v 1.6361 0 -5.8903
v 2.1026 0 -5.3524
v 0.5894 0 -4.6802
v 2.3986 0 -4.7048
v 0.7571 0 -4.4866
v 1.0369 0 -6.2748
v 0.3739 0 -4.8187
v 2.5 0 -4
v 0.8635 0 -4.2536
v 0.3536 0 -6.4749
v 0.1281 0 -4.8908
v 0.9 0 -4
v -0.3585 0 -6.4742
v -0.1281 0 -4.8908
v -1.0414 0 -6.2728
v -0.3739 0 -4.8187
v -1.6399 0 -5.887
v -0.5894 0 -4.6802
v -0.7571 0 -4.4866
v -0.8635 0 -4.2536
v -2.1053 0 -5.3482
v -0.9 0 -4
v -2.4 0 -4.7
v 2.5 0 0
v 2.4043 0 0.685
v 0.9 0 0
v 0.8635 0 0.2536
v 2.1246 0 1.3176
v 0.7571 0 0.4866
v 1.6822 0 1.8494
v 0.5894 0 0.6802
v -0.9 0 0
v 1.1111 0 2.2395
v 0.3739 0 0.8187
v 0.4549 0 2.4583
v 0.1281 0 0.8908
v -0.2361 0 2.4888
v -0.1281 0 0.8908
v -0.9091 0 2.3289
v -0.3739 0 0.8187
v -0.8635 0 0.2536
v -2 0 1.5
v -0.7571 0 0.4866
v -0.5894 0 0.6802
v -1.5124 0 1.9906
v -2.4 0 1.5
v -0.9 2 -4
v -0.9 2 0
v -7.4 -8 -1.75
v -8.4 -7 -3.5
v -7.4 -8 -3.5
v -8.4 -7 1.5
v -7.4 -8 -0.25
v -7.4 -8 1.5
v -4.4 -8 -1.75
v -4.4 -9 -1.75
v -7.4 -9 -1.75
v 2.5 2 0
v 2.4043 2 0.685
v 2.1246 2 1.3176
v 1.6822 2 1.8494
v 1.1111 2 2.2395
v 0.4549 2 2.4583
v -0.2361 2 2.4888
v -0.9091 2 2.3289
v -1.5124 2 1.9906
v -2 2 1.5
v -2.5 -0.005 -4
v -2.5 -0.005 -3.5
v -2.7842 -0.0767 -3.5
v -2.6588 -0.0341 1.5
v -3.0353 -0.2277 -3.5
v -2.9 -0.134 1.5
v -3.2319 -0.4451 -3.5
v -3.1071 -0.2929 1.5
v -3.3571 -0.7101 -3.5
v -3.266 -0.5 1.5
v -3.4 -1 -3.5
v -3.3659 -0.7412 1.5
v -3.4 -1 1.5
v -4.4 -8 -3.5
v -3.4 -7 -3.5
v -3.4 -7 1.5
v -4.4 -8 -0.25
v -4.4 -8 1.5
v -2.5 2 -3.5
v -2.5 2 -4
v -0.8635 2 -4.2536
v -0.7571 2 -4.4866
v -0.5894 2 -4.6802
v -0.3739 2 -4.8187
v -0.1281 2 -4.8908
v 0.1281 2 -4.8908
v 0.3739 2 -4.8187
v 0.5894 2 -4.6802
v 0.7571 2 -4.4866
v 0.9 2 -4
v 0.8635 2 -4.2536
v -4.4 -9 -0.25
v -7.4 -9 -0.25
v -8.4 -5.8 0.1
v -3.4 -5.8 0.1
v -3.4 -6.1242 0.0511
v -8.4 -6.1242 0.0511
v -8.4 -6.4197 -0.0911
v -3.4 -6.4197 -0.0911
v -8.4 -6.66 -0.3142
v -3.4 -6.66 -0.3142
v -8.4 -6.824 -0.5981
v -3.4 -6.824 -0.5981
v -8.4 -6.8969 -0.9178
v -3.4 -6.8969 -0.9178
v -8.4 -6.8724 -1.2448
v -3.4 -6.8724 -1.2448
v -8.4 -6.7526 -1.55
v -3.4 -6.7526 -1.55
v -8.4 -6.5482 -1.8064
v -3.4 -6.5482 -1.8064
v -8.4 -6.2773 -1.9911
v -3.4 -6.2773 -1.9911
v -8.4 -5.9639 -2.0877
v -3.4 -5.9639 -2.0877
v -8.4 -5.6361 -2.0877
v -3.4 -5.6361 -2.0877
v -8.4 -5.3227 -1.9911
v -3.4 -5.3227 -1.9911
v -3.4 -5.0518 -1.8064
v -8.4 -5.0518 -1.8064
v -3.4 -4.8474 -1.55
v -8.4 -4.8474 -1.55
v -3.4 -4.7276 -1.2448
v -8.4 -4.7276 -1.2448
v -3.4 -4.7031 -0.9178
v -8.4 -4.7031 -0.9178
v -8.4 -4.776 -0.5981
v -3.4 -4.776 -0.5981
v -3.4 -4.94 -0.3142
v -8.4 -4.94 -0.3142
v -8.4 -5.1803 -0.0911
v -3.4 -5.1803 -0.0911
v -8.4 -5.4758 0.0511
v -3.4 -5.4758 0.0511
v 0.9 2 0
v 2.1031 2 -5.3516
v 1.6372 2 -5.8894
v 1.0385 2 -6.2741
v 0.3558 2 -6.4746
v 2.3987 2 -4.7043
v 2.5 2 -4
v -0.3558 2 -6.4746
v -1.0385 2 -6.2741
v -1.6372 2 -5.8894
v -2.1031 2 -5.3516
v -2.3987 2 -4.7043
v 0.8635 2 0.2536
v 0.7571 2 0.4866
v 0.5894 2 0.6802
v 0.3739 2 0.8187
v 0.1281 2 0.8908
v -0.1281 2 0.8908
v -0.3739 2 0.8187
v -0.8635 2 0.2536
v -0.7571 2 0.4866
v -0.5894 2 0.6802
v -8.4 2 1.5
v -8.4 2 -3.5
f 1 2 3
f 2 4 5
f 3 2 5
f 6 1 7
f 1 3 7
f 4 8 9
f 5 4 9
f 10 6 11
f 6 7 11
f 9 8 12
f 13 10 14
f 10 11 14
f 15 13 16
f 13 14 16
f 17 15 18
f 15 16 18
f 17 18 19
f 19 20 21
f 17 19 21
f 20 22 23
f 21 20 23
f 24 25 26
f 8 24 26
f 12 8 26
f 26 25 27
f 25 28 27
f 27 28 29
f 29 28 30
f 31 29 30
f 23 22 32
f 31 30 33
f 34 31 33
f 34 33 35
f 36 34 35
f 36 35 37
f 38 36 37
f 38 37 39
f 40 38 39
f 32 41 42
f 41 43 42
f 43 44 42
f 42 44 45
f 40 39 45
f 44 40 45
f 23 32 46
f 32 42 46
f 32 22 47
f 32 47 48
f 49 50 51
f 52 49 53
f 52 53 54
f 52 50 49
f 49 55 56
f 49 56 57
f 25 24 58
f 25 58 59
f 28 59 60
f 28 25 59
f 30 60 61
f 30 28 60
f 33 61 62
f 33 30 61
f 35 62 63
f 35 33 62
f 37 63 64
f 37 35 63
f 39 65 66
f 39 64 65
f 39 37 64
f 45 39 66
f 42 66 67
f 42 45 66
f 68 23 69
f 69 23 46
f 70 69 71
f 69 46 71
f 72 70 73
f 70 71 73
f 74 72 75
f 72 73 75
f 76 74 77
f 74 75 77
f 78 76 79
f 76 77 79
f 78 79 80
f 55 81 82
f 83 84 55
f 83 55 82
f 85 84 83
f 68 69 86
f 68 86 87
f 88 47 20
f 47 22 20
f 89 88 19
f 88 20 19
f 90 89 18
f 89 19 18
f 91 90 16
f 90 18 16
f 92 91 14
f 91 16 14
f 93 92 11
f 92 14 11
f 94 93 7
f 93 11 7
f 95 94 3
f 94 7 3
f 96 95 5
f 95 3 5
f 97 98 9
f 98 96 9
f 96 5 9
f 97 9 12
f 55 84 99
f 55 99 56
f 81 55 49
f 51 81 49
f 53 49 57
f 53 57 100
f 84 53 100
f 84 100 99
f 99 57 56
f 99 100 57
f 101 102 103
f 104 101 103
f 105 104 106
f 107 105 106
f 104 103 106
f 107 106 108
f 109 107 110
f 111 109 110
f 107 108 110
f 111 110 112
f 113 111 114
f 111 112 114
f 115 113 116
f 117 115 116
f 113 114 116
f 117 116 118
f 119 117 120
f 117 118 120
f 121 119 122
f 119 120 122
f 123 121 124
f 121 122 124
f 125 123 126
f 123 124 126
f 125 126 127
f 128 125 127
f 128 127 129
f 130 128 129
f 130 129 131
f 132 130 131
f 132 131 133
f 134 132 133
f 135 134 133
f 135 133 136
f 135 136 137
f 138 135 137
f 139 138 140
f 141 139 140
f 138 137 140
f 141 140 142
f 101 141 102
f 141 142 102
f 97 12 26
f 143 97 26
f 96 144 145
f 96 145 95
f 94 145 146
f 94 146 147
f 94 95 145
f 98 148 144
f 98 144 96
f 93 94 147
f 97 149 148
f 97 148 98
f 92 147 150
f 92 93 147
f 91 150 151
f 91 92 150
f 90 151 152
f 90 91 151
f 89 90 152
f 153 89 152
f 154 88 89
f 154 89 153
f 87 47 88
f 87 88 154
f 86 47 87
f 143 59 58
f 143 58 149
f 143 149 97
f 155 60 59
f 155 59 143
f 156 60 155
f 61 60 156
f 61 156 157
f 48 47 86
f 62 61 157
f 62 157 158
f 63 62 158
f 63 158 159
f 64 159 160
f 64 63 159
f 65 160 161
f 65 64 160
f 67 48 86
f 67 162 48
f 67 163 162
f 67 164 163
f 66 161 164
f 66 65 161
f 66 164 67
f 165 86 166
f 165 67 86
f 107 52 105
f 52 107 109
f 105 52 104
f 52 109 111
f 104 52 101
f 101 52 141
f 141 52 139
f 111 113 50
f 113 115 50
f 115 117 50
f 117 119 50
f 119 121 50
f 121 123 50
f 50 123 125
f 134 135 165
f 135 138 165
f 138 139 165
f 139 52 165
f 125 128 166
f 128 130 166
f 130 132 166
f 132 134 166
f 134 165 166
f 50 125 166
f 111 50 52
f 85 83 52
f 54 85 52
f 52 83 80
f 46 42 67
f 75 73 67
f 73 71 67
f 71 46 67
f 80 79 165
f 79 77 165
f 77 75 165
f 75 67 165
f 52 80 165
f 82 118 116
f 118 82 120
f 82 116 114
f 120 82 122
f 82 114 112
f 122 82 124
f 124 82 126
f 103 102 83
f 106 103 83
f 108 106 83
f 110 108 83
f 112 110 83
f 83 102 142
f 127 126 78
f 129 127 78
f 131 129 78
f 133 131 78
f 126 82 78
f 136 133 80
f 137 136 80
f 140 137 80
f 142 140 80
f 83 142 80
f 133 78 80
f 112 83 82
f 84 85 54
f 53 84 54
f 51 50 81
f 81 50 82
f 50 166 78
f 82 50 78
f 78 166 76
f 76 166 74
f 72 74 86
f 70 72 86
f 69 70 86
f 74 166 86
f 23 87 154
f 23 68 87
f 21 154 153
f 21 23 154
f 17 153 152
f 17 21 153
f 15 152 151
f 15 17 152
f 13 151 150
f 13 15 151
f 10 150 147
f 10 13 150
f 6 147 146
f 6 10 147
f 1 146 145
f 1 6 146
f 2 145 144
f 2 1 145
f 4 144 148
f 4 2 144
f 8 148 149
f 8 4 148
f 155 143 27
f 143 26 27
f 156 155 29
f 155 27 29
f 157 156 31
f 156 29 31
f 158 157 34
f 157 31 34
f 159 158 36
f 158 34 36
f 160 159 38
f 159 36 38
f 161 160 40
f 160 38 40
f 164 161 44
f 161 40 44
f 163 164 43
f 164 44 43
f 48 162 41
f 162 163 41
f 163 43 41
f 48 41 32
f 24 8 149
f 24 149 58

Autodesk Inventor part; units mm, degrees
ref_plane "YZ Plane" through (0, 0, 0) normal (1, 0, 0) x (0, 1, 0)
ref_plane "XZ Plane" through (0, 0, 0) normal (0, 1, 0) x (-1, 0, 0)
sketch "スケッチ1" plane through (0, 0, 0) normal (0, 1, 0) x (-1, 0, 0)
  arc A0 (0.9, 0) -> (-0.9, 0) centre (0, 0) ccw
  arc A1 (-0.9, -4) -> (0.9, -4) centre (0, -4) ccw
  line L0 (0, 0) -> (0, -4) construction
  line L1 (-0.9, -4) -> (-0.9, 0)
  line L2 (0.9, -4) -> (0.9, 0)
  arc A2 (-2.5, -4) -> (2.5, -4) centre (0, -4) ccw
  line L3 (-2.5, -4) -> (-2.5, 0)
  arc A3 (2.5, 0) -> (-2.5, 0) centre (0, 0) ccw
  line L4 (2.5, 0) -> (2.5, -4)
  line L5 (8.4, -3.5) -> (2.5, -3.5)
  line L6 (2, 1.5) -> (8.4, 1.5)
  line L7 (8.4, 1.5) -> (8.4, -3.5)
  line L8 (8.4, -3.5) -> (3.4, -3.5)
  line L9 (3.4, -3.5) -> (3.4, 1.5)
  line L10 (3.4, 1.5) -> (8.4, 1.5)
  line L11 (8.4, 1.5) -> (8.4, -3.5)
  point P0 (2.5, -2.5)
  point P1 (-2.5, -2.5)
  point P2 (1.2097, 2.1879)
  point P3 (5.9, -3.5)
  point P4 (5.9, -3.5)
  point P5 (3.4, -3.5)
  point P6 (0, 2.5)
  dimension "d0" = 1.8
  dimension "d1" = 4
  dimension "d2" = 1.6
  dimension "d6" = 5
  dimension "d27" = 5.9
  dimension "d28" = 5
  dimension "d46" = 1
extrude "押し出し1" add sketch "スケッチ1" along normal blind 2
extrude "押し出し4" add sketch "スケッチ1" against normal blind 8 contours L9 L6 L7 L5
sketch "スケッチ5" plane through (-8.4, 2, -3.5) normal (-1, 0, 0) x (0, 0, 1)
  line L0 (5, -10) -> (0, -10) projected
  point P0 (3.5, -2)
  point P1 (2.5, -7.8)
  point P2 (2.5, -10)
  dimension "d31" = 2.2
hole "穴2" at (-8.4, -5.8, -1) direction (1, 0, 0) diameter 2.2 end through all
fillet "フィレット2" radius 1 1 edges at (-3.4, 0, -1)
ref_plane "作業平面2" through (0, 0, 0) normal (1, 0, 0) x (0, 0, -1)
chamfer "面取り1" distance 1 angle 45 2 edges at (-8.4, -8, -1) (-3.4, -8, -1)
sketch "スケッチ6" plane through (0, -8, 0) normal (0, -1, 0) x (1, 0, 0)
  line L0 (-4.4, 1.5) -> (-4.4, -3.5) projected
  line L1 (-7.4, -3.5) -> (-7.4, 1.5) projected
  line L2 (-7.4, -0.25) -> (-4.4, -0.25)
  line L3 (-4.4, -0.25) -> (-4.4, -1.75)
  line L4 (-4.4, -1.75) -> (-7.4, -1.75)
  line L5 (-7.4, -1.75) -> (-7.4, -0.25)
  point P0 (0, 0)
  point P1 (-7.4, -1)
  point P2 (-7.4, -1.75)
  point P3 (-4.4, -0.25)
  dimension "d43" = 1.5
extrude "押し出し5" add sketch "スケッチ6" along normal blind 1
properties part number "om_Drop" material "ABS プラスチック"
